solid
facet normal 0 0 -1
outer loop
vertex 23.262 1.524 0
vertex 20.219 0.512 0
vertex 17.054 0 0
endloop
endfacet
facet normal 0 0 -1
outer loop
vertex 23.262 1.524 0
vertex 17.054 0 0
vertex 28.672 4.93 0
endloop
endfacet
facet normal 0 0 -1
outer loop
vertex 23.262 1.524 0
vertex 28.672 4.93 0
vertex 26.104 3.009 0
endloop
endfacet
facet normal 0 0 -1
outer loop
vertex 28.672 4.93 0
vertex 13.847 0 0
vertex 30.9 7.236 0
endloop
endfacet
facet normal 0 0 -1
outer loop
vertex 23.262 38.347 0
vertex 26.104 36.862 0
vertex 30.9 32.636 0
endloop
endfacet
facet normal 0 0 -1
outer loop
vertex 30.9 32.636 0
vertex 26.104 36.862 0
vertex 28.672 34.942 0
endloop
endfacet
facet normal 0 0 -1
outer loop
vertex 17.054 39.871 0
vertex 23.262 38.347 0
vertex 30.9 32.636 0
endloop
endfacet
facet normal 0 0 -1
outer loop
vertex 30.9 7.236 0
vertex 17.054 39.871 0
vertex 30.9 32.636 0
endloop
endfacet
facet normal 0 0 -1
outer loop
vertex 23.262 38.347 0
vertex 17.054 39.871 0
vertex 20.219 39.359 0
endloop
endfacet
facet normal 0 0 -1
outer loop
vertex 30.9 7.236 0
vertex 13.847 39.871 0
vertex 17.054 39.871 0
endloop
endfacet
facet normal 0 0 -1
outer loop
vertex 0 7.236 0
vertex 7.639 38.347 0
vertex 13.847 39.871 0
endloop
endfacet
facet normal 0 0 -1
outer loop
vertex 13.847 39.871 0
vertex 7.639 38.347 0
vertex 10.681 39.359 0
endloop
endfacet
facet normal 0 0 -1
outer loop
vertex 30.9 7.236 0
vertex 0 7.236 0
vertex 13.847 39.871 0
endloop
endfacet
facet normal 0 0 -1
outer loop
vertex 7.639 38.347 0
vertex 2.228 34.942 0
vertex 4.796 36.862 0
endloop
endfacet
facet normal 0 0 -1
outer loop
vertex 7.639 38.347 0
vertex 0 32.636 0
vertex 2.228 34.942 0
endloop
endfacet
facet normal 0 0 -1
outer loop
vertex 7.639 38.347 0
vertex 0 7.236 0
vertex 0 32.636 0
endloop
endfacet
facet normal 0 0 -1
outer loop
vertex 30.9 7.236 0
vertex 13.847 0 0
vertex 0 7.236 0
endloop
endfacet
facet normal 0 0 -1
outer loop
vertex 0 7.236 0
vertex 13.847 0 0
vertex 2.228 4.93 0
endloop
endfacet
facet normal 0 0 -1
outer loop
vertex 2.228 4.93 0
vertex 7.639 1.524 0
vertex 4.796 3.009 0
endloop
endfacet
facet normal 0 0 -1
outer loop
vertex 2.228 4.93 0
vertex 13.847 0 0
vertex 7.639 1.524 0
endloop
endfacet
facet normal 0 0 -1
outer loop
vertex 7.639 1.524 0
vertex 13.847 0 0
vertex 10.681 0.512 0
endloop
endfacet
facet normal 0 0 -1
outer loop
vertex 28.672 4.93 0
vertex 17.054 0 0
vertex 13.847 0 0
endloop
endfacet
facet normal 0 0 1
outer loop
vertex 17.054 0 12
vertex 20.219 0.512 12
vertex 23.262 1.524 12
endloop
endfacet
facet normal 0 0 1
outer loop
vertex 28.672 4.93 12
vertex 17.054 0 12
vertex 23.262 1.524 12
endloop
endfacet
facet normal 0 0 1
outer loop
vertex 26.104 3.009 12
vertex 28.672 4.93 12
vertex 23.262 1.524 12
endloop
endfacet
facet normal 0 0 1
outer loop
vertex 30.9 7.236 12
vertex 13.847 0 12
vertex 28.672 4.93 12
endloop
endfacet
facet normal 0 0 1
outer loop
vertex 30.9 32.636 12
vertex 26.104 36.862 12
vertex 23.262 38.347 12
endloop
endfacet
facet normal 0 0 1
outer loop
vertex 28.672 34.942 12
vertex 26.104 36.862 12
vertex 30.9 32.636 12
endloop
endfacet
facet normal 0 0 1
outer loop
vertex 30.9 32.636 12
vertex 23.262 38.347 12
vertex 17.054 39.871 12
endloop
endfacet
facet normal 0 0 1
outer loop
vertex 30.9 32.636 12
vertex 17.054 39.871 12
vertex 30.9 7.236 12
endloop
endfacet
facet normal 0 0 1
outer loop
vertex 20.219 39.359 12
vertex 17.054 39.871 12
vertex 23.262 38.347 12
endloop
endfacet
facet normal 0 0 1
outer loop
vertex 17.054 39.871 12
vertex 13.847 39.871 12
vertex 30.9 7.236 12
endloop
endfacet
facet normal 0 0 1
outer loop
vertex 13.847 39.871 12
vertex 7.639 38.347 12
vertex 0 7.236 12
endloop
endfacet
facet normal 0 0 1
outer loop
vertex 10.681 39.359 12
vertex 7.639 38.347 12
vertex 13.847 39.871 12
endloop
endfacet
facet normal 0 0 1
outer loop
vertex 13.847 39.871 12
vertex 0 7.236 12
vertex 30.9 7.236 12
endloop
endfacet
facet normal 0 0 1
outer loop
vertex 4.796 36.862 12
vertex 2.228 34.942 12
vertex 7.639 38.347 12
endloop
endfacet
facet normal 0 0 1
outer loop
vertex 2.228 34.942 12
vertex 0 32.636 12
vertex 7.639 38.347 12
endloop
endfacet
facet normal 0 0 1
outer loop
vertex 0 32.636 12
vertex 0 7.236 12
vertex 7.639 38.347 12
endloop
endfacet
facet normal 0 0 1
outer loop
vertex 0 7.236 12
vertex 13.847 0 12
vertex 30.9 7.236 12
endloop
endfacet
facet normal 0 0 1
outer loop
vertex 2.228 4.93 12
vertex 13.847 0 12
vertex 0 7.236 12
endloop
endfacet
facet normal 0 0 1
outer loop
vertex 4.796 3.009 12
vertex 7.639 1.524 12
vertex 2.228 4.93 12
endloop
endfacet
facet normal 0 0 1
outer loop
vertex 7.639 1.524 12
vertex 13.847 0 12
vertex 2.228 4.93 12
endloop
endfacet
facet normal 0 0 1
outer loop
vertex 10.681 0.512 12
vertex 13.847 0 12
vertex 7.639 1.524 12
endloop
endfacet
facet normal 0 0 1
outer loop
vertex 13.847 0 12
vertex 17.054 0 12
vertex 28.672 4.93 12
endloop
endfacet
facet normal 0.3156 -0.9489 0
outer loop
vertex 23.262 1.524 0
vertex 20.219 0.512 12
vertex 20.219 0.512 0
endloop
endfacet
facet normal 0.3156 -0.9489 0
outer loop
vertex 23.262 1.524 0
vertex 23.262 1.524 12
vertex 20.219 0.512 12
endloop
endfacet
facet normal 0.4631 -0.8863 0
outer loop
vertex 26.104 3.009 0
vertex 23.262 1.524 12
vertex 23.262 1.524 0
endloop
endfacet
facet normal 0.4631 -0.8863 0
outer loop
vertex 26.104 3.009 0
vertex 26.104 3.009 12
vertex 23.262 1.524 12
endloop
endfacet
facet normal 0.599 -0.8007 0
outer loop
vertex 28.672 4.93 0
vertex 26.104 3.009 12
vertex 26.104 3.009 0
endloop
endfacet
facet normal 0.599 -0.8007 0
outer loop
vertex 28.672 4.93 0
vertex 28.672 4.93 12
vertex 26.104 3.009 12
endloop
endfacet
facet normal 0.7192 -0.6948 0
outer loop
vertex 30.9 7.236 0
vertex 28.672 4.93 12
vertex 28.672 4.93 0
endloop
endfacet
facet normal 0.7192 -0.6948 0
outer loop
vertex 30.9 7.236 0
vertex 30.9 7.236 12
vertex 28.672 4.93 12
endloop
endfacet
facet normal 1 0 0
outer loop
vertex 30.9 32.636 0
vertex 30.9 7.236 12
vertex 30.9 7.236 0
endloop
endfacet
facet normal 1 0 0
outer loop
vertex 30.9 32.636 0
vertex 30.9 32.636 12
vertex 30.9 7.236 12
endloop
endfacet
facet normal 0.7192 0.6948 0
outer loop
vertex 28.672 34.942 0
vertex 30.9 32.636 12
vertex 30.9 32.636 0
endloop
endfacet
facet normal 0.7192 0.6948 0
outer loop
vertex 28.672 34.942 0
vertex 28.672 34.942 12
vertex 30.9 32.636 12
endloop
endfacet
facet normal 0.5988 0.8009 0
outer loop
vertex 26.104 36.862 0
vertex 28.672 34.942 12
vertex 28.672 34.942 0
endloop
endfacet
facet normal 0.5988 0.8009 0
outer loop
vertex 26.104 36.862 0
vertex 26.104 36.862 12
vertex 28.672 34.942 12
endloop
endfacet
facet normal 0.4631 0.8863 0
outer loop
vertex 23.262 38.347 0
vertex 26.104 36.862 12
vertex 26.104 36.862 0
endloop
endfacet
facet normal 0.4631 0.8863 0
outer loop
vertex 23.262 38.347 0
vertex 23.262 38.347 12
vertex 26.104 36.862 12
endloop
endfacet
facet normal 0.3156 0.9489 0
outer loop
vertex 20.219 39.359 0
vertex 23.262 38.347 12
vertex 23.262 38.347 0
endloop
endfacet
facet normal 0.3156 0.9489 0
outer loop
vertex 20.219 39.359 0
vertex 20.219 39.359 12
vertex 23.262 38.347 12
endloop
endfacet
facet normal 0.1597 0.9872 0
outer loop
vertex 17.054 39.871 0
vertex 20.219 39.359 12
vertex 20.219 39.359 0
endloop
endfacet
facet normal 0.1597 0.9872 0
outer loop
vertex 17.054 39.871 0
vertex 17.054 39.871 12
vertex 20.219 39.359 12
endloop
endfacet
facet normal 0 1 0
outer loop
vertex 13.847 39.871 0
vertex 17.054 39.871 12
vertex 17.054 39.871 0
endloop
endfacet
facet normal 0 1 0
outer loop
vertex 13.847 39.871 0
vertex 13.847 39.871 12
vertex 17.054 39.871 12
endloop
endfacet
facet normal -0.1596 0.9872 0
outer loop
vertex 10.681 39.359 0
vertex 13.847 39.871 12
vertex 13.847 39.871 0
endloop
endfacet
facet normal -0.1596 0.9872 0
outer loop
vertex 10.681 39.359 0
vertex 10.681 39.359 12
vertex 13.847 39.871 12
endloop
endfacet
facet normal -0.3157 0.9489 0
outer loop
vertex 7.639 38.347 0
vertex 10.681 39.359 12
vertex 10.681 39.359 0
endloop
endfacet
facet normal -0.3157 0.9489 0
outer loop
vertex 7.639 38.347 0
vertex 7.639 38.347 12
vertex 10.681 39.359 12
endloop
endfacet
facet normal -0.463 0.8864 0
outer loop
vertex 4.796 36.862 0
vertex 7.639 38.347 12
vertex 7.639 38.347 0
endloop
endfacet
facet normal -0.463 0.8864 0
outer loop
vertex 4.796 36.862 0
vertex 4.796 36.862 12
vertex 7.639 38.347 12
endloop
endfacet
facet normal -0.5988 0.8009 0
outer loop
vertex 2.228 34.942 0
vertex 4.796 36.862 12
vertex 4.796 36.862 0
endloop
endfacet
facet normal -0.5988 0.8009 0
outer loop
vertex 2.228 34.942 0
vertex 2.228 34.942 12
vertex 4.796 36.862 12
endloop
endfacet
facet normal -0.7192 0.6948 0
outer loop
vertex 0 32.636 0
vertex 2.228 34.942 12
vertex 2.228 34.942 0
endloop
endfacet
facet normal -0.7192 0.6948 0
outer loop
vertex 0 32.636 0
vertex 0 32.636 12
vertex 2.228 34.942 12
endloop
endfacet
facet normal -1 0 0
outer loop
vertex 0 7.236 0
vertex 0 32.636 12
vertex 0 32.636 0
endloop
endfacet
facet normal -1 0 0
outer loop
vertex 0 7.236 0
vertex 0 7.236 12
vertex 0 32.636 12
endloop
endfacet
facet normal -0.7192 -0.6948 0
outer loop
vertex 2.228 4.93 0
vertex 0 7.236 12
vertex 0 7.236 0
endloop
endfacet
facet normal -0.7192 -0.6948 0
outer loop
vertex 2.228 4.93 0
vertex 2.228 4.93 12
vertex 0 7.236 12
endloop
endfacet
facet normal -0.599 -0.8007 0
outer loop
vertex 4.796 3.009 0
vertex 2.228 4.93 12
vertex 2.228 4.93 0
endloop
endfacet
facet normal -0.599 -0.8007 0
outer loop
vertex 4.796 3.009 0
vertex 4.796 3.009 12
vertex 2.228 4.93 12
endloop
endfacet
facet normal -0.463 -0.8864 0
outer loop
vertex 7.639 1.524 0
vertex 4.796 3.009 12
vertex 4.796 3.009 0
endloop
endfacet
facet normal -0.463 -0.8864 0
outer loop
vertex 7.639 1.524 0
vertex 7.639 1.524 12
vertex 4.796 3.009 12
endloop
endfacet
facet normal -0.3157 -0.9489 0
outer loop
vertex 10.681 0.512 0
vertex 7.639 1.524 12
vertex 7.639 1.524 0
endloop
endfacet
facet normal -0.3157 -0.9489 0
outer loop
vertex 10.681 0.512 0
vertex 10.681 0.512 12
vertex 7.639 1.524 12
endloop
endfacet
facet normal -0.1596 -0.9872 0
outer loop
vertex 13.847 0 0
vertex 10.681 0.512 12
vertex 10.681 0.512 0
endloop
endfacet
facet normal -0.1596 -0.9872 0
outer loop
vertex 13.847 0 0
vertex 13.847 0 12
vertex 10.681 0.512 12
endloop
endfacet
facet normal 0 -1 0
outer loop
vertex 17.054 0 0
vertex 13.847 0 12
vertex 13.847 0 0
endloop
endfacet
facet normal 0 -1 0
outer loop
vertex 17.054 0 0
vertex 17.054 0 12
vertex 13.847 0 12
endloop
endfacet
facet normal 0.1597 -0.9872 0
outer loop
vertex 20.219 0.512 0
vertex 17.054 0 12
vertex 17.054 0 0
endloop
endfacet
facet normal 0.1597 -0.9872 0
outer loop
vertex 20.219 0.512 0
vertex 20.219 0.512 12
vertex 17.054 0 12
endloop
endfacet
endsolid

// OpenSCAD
$fn = 32;

// ----------------------------------------------------------------------
// Flat adaptor: double_d, 12 mm thick
// ----------------------------------------------------------------------

// --- parameters (mm) ---
profile_height = 12;      // extrusion height
profile_points = 24;      // points of the closed outline

profile = [[30.9, 32.636], [28.672, 34.942], [26.104, 36.862], [23.262, 38.347], [20.219, 39.359], [17.054, 39.871], [13.847, 39.871], [10.681, 39.359], [7.639, 38.347], [4.796, 36.862], [2.228, 34.942], [0, 32.636], [0, 7.236], [2.228, 4.93], [4.796, 3.009], [7.639, 1.524], [10.681, 0.512], [13.847, 0], [17.054, 0], [20.219, 0.512], [23.262, 1.524], [26.104, 3.009], [28.672, 4.93], [30.9, 7.236]];  // single closed polygon, 24 points, counter clockwise

// --- the one profile operation ---
linear_extrude(height = profile_height) polygon(points = profile);
